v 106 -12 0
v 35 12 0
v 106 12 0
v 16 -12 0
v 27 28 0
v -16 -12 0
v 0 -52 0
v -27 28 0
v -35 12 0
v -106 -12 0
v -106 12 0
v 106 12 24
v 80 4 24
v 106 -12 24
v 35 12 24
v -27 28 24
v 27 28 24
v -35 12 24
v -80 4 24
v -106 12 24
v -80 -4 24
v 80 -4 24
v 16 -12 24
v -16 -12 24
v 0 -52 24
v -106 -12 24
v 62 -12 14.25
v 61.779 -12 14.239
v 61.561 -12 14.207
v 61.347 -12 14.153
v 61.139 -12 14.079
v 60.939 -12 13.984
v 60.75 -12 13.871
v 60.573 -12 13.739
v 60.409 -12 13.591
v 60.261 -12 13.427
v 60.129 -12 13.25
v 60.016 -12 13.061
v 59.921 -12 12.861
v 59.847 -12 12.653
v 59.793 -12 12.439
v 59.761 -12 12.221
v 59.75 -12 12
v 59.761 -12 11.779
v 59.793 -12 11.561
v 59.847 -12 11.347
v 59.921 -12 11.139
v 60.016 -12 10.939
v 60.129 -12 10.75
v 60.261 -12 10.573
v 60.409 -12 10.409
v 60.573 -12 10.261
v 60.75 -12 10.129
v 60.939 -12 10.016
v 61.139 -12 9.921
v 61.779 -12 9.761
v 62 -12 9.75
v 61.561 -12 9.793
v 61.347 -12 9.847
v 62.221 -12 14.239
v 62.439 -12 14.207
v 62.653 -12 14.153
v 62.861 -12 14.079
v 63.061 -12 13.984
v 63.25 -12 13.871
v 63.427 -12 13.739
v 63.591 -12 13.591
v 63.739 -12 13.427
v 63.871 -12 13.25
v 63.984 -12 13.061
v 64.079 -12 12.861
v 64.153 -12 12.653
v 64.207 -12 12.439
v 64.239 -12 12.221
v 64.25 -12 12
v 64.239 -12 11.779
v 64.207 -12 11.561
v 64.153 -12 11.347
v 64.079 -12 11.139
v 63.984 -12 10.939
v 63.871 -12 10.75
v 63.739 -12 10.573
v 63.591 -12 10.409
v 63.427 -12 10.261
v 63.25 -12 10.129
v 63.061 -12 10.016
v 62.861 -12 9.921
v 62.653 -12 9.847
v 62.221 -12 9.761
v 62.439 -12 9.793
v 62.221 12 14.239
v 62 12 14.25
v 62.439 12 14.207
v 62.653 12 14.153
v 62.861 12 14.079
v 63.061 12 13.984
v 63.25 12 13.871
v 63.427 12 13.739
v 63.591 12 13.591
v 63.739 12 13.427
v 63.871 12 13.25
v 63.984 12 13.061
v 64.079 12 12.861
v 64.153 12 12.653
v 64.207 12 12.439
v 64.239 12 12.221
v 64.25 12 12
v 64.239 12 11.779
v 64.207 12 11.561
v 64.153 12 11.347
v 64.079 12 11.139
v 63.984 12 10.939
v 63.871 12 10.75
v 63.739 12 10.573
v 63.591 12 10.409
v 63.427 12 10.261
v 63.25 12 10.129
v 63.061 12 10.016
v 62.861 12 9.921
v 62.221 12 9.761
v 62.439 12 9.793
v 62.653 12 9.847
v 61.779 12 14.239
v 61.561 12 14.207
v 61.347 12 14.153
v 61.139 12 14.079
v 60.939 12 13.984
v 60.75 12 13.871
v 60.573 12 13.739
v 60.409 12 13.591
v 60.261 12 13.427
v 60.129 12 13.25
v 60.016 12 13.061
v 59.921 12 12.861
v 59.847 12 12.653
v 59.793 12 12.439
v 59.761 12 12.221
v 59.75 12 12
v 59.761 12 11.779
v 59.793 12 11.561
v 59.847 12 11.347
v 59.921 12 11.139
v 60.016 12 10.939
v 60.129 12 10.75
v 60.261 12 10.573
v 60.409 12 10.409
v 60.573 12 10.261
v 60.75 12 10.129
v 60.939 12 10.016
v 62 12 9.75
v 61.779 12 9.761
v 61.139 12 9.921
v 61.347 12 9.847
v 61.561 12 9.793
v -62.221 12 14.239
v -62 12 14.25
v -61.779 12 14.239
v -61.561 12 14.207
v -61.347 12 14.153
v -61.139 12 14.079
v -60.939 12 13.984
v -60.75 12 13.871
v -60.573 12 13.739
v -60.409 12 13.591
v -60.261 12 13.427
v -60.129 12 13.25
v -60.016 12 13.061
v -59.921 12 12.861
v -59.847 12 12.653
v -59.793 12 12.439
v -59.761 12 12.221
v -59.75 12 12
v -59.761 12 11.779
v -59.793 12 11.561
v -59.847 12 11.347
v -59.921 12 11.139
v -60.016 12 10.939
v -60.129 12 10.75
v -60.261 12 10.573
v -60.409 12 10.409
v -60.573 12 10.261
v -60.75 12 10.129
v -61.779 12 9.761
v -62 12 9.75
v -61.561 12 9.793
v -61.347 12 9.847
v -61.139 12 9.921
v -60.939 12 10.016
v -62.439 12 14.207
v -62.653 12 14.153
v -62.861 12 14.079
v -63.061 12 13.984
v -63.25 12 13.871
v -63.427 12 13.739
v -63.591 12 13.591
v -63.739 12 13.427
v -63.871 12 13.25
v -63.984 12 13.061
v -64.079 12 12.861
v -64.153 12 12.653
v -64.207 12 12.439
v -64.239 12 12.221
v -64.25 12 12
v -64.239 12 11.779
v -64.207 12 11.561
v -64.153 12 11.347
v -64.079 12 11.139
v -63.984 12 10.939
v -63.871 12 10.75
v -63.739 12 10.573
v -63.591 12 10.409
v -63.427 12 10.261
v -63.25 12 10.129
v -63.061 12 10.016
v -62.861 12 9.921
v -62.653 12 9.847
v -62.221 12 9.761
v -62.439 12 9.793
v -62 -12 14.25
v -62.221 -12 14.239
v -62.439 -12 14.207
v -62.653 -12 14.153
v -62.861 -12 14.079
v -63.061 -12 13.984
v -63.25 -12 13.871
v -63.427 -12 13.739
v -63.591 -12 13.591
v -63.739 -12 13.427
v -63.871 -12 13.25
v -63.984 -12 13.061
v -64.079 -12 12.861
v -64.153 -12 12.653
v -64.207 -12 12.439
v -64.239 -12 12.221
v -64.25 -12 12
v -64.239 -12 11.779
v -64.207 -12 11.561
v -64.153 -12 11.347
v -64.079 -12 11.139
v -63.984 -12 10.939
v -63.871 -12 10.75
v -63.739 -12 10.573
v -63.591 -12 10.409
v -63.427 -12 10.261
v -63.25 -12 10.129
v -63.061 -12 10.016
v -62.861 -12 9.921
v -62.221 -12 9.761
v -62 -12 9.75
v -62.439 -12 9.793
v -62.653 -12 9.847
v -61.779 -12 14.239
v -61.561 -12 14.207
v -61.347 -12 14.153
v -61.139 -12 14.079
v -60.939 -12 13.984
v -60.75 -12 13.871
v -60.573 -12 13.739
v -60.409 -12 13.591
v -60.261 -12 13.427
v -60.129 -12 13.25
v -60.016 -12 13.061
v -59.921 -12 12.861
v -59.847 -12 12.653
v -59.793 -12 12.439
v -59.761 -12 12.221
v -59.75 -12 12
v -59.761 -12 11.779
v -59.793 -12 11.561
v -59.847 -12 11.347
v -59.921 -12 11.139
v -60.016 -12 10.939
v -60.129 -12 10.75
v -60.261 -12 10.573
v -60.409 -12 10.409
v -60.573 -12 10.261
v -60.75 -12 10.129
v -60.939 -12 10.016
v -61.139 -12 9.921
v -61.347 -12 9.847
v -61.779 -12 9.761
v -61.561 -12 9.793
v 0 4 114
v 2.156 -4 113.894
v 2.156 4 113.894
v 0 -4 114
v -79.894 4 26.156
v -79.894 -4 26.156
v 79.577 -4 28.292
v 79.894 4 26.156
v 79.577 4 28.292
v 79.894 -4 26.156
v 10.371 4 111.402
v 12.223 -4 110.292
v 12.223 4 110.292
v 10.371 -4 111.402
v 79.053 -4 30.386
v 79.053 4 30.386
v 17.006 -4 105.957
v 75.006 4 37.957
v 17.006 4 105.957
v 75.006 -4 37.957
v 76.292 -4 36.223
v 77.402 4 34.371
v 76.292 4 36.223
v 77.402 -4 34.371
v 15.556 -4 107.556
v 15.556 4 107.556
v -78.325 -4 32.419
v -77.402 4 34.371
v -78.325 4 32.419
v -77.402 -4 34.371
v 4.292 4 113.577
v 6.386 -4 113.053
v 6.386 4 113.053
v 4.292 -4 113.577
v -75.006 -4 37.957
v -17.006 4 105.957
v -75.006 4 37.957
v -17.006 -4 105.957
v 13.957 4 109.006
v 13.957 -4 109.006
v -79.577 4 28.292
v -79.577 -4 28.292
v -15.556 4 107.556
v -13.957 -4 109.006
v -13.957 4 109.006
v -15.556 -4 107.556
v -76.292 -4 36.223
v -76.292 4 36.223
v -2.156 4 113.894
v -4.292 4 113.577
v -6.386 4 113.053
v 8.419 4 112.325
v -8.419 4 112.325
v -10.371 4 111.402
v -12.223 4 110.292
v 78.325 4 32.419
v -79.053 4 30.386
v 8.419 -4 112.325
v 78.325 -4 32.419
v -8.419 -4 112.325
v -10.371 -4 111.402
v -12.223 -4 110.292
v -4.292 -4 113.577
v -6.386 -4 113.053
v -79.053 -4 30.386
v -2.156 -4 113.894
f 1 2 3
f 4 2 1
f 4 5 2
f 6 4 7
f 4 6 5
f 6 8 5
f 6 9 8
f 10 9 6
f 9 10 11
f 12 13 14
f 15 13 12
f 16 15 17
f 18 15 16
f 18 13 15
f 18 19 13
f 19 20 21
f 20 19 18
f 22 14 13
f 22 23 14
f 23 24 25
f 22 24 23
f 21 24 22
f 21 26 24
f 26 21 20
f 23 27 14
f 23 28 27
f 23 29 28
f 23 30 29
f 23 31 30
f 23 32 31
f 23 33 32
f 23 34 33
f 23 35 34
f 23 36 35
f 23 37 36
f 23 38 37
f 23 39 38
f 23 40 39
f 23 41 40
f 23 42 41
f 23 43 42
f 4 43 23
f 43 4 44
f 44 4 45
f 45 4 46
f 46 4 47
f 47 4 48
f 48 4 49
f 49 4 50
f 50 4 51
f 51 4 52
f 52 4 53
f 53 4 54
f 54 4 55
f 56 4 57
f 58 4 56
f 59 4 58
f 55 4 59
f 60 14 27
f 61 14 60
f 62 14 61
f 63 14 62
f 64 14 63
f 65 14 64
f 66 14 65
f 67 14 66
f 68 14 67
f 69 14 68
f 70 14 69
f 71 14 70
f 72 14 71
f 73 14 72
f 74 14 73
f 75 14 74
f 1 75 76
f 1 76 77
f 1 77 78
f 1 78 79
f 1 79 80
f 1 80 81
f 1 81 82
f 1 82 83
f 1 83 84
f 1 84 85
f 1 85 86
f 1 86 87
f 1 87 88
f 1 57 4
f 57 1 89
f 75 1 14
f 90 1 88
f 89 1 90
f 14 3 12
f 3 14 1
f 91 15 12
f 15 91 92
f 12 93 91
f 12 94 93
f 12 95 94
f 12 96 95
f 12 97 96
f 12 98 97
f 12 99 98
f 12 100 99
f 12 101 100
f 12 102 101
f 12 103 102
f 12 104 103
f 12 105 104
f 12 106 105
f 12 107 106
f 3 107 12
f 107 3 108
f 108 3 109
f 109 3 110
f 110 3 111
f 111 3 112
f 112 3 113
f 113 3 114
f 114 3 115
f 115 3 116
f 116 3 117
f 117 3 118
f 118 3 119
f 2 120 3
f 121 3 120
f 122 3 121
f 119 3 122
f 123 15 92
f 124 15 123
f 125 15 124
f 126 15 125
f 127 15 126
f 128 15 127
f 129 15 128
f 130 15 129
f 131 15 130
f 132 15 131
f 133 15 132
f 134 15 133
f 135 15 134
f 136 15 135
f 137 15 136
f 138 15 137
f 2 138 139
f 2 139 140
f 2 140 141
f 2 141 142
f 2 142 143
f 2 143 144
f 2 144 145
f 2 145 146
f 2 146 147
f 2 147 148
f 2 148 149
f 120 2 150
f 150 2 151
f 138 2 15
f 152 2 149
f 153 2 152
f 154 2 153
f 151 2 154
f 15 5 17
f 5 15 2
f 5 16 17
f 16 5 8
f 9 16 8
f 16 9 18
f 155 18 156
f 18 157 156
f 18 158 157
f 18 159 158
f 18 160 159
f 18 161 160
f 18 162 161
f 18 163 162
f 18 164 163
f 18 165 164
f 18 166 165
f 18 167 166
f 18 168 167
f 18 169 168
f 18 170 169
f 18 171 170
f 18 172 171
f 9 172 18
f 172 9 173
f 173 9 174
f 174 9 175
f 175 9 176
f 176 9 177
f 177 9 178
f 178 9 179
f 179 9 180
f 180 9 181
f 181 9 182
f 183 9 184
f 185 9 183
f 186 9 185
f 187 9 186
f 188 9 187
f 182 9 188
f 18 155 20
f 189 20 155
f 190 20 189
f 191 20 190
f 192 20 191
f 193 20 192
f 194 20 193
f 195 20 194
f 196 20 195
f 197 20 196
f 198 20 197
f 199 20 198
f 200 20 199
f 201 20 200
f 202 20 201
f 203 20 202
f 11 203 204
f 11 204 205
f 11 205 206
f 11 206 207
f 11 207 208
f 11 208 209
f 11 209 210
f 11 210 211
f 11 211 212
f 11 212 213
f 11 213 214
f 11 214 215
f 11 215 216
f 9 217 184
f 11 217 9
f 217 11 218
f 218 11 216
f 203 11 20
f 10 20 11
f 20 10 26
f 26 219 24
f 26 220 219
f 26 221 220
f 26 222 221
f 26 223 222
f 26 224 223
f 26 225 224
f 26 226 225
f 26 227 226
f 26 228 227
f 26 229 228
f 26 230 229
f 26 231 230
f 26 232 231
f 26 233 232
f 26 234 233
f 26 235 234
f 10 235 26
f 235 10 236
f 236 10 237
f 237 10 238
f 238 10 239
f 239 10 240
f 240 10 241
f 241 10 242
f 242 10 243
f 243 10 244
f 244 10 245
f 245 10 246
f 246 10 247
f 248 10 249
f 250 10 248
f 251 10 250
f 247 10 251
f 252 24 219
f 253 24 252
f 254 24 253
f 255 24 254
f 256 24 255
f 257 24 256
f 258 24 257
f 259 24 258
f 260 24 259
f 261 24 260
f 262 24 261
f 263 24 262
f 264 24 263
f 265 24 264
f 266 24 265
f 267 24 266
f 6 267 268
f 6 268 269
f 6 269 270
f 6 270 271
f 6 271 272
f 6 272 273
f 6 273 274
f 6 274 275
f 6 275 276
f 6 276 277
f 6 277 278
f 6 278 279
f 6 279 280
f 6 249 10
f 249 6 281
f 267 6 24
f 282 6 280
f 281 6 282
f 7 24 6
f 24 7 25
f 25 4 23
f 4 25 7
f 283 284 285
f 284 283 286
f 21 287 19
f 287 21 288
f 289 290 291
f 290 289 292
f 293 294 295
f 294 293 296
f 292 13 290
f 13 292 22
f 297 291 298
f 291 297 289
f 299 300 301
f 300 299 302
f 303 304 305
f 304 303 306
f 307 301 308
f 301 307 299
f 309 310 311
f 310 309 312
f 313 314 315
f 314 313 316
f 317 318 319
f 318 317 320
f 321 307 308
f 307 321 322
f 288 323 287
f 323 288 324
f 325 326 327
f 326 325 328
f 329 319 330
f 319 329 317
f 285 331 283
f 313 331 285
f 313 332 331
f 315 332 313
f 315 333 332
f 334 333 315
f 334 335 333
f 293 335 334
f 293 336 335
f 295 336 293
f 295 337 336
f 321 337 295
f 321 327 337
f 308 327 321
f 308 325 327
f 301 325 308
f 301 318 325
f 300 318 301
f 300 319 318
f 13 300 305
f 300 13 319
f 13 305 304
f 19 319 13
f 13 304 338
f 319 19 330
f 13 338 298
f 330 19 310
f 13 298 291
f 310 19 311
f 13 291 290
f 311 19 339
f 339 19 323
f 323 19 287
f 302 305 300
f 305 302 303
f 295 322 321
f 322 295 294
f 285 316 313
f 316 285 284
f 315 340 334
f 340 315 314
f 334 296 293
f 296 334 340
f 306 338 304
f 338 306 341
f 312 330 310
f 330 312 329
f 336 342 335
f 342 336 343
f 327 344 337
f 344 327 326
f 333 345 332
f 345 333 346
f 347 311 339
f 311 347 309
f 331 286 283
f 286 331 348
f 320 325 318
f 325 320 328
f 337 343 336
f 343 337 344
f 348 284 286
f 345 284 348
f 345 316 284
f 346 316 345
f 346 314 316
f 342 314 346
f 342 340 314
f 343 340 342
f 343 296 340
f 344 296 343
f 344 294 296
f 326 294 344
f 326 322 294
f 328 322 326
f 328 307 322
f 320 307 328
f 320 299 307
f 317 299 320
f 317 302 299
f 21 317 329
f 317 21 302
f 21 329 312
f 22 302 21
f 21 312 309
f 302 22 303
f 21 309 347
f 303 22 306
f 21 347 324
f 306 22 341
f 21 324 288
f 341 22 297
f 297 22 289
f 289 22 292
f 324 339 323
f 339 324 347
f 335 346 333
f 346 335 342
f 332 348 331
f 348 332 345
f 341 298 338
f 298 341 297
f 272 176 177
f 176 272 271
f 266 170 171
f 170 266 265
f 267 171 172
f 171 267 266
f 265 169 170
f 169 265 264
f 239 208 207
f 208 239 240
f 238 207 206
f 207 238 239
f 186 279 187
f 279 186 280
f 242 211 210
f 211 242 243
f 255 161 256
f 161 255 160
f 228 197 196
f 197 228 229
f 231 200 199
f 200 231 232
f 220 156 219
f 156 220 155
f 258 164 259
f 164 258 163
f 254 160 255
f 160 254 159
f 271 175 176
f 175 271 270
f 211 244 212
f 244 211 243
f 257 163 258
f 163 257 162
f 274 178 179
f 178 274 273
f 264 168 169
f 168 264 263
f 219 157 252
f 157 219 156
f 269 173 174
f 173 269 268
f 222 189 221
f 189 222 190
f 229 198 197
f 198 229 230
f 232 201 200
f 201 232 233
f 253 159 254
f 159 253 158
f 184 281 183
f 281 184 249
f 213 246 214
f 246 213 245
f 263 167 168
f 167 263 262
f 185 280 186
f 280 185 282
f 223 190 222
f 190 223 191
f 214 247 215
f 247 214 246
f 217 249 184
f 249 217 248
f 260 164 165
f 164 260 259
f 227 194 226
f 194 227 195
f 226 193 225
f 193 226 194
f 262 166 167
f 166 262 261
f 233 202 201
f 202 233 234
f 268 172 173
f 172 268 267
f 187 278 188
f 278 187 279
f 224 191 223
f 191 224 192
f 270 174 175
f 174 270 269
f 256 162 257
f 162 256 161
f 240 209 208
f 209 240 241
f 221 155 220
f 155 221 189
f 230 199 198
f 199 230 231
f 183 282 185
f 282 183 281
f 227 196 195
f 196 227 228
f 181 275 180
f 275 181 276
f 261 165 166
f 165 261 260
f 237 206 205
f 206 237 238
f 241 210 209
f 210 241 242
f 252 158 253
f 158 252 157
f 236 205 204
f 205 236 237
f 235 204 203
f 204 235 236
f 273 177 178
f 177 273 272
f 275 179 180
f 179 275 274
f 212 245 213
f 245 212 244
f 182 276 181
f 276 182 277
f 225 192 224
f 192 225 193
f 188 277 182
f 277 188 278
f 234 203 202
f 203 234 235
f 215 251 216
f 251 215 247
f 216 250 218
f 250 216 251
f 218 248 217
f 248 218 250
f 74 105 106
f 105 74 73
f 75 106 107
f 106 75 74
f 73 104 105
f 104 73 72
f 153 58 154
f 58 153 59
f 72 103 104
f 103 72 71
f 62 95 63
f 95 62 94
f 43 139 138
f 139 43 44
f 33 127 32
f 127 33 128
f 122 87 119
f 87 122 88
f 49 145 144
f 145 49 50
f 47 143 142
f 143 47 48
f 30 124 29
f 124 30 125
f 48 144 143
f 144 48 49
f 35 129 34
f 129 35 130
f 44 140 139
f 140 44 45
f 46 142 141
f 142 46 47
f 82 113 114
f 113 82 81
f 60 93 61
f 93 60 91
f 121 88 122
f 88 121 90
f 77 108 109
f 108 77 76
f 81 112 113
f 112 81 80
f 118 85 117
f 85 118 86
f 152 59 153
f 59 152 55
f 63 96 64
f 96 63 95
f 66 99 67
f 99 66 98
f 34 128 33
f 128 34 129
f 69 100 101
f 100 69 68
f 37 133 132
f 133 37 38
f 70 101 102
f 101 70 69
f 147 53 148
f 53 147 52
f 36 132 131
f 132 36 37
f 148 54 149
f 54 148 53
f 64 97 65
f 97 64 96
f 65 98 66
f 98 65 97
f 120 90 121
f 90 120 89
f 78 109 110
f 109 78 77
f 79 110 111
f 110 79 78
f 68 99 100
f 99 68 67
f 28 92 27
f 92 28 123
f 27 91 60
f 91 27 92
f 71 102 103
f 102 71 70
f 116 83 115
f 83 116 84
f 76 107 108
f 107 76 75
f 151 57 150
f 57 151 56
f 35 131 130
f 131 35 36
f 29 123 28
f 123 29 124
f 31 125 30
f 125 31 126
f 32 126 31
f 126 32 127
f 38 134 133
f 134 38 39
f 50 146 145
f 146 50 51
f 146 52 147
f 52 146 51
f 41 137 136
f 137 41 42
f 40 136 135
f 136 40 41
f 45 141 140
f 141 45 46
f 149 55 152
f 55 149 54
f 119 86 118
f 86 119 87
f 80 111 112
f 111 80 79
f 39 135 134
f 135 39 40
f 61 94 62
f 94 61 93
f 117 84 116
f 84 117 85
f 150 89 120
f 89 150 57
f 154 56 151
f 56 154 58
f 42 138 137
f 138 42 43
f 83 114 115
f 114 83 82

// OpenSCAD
//
// Next-bird parametric body (OpenSCAD)
// Units: mm
//

$fn = 64;

// =========================
// Parameters (edit these)
// =========================
thickness = 24;          // overall body thickness (Z)

left_wing_len  = 71;     // from body shoulder to left tip
right_wing_len = 71;     // from body shoulder to right tip

body_left_x  = -35;      // shoulder x (left side)
body_right_x =  35;      // shoulder x (right side)

nose_len = 40;           // front center protrusion (from shoulder line to tip)
rear_notch_depth = 10;   // rear inner notch depth

// fin
fin_thickness = 8;
fin_height    = 68;      // above body top
fin_length    = 160;     // along X direction
fin_round_r   = 22;      // roundness of fin top

// hole / eyelet pilot holes (optional)
make_holes = true;
eyelet_hole_d = 4.5;
left_eyelet_pos  = [-62, -6, thickness/2];
right_eyelet_pos = [ 62, -6, thickness/2];

// =========================
// 2D planform
// =========================
//
// Y+ = "back", Y- = "front" (nose side)
//
module body_2d() {
    polygon(points=[
        // left wing tip (rear and front edges)
        [body_left_x - left_wing_len,  12],
        [body_left_x,                 12],

        // transition to center/rear
        [body_left_x + 8,             28],
        [body_right_x - 8,            28],

        // right rear shoulder and wing
        [body_right_x,                12],
        [body_right_x + right_wing_len, 12],
        [body_right_x + right_wing_len, -12],
        [body_right_x,               -12],

        // slope toward nose
        [16,                         -12],
        [0,                          -(12 + nose_len)],
        [-16,                        -12],

        // back to left side
        [body_left_x,                -12],
        [body_left_x - left_wing_len, -12]
    ]);
}

// =========================
// Fin profile (2D in XZ, then extruded in Y)
// =========================
module fin_profile_2d() {
    // Rounded "sail" style fin
    hull() {
        translate([-fin_length/2 + fin_round_r, 0]) circle(r=fin_round_r);
        translate([ fin_length/2 - fin_round_r, 0]) circle(r=fin_round_r);
        translate([0, fin_height]) circle(r=fin_round_r);
    }
}

// =========================
// Main model
// =========================
module next_bird() {
    difference() {
        union() {
            // Base body
            linear_extrude(height=thickness)
                body_2d();

            // Center fin (mounted on top centerline)
            translate([0, 0, thickness])
            rotate([90,0,0])  // extrude through Y
            linear_extrude(height=fin_thickness, center=true)
                fin_profile_2d();
        }

        // Optional eyelet pilot holes
        if (make_holes) {
            translate(left_eyelet_pos)
                rotate([90,0,0]) cylinder(d=eyelet_hole_d, h=40, center=true);

            translate(right_eyelet_pos)
                rotate([90,0,0]) cylinder(d=eyelet_hole_d, h=40, center=true);
        }
    }
}

next_bird();
